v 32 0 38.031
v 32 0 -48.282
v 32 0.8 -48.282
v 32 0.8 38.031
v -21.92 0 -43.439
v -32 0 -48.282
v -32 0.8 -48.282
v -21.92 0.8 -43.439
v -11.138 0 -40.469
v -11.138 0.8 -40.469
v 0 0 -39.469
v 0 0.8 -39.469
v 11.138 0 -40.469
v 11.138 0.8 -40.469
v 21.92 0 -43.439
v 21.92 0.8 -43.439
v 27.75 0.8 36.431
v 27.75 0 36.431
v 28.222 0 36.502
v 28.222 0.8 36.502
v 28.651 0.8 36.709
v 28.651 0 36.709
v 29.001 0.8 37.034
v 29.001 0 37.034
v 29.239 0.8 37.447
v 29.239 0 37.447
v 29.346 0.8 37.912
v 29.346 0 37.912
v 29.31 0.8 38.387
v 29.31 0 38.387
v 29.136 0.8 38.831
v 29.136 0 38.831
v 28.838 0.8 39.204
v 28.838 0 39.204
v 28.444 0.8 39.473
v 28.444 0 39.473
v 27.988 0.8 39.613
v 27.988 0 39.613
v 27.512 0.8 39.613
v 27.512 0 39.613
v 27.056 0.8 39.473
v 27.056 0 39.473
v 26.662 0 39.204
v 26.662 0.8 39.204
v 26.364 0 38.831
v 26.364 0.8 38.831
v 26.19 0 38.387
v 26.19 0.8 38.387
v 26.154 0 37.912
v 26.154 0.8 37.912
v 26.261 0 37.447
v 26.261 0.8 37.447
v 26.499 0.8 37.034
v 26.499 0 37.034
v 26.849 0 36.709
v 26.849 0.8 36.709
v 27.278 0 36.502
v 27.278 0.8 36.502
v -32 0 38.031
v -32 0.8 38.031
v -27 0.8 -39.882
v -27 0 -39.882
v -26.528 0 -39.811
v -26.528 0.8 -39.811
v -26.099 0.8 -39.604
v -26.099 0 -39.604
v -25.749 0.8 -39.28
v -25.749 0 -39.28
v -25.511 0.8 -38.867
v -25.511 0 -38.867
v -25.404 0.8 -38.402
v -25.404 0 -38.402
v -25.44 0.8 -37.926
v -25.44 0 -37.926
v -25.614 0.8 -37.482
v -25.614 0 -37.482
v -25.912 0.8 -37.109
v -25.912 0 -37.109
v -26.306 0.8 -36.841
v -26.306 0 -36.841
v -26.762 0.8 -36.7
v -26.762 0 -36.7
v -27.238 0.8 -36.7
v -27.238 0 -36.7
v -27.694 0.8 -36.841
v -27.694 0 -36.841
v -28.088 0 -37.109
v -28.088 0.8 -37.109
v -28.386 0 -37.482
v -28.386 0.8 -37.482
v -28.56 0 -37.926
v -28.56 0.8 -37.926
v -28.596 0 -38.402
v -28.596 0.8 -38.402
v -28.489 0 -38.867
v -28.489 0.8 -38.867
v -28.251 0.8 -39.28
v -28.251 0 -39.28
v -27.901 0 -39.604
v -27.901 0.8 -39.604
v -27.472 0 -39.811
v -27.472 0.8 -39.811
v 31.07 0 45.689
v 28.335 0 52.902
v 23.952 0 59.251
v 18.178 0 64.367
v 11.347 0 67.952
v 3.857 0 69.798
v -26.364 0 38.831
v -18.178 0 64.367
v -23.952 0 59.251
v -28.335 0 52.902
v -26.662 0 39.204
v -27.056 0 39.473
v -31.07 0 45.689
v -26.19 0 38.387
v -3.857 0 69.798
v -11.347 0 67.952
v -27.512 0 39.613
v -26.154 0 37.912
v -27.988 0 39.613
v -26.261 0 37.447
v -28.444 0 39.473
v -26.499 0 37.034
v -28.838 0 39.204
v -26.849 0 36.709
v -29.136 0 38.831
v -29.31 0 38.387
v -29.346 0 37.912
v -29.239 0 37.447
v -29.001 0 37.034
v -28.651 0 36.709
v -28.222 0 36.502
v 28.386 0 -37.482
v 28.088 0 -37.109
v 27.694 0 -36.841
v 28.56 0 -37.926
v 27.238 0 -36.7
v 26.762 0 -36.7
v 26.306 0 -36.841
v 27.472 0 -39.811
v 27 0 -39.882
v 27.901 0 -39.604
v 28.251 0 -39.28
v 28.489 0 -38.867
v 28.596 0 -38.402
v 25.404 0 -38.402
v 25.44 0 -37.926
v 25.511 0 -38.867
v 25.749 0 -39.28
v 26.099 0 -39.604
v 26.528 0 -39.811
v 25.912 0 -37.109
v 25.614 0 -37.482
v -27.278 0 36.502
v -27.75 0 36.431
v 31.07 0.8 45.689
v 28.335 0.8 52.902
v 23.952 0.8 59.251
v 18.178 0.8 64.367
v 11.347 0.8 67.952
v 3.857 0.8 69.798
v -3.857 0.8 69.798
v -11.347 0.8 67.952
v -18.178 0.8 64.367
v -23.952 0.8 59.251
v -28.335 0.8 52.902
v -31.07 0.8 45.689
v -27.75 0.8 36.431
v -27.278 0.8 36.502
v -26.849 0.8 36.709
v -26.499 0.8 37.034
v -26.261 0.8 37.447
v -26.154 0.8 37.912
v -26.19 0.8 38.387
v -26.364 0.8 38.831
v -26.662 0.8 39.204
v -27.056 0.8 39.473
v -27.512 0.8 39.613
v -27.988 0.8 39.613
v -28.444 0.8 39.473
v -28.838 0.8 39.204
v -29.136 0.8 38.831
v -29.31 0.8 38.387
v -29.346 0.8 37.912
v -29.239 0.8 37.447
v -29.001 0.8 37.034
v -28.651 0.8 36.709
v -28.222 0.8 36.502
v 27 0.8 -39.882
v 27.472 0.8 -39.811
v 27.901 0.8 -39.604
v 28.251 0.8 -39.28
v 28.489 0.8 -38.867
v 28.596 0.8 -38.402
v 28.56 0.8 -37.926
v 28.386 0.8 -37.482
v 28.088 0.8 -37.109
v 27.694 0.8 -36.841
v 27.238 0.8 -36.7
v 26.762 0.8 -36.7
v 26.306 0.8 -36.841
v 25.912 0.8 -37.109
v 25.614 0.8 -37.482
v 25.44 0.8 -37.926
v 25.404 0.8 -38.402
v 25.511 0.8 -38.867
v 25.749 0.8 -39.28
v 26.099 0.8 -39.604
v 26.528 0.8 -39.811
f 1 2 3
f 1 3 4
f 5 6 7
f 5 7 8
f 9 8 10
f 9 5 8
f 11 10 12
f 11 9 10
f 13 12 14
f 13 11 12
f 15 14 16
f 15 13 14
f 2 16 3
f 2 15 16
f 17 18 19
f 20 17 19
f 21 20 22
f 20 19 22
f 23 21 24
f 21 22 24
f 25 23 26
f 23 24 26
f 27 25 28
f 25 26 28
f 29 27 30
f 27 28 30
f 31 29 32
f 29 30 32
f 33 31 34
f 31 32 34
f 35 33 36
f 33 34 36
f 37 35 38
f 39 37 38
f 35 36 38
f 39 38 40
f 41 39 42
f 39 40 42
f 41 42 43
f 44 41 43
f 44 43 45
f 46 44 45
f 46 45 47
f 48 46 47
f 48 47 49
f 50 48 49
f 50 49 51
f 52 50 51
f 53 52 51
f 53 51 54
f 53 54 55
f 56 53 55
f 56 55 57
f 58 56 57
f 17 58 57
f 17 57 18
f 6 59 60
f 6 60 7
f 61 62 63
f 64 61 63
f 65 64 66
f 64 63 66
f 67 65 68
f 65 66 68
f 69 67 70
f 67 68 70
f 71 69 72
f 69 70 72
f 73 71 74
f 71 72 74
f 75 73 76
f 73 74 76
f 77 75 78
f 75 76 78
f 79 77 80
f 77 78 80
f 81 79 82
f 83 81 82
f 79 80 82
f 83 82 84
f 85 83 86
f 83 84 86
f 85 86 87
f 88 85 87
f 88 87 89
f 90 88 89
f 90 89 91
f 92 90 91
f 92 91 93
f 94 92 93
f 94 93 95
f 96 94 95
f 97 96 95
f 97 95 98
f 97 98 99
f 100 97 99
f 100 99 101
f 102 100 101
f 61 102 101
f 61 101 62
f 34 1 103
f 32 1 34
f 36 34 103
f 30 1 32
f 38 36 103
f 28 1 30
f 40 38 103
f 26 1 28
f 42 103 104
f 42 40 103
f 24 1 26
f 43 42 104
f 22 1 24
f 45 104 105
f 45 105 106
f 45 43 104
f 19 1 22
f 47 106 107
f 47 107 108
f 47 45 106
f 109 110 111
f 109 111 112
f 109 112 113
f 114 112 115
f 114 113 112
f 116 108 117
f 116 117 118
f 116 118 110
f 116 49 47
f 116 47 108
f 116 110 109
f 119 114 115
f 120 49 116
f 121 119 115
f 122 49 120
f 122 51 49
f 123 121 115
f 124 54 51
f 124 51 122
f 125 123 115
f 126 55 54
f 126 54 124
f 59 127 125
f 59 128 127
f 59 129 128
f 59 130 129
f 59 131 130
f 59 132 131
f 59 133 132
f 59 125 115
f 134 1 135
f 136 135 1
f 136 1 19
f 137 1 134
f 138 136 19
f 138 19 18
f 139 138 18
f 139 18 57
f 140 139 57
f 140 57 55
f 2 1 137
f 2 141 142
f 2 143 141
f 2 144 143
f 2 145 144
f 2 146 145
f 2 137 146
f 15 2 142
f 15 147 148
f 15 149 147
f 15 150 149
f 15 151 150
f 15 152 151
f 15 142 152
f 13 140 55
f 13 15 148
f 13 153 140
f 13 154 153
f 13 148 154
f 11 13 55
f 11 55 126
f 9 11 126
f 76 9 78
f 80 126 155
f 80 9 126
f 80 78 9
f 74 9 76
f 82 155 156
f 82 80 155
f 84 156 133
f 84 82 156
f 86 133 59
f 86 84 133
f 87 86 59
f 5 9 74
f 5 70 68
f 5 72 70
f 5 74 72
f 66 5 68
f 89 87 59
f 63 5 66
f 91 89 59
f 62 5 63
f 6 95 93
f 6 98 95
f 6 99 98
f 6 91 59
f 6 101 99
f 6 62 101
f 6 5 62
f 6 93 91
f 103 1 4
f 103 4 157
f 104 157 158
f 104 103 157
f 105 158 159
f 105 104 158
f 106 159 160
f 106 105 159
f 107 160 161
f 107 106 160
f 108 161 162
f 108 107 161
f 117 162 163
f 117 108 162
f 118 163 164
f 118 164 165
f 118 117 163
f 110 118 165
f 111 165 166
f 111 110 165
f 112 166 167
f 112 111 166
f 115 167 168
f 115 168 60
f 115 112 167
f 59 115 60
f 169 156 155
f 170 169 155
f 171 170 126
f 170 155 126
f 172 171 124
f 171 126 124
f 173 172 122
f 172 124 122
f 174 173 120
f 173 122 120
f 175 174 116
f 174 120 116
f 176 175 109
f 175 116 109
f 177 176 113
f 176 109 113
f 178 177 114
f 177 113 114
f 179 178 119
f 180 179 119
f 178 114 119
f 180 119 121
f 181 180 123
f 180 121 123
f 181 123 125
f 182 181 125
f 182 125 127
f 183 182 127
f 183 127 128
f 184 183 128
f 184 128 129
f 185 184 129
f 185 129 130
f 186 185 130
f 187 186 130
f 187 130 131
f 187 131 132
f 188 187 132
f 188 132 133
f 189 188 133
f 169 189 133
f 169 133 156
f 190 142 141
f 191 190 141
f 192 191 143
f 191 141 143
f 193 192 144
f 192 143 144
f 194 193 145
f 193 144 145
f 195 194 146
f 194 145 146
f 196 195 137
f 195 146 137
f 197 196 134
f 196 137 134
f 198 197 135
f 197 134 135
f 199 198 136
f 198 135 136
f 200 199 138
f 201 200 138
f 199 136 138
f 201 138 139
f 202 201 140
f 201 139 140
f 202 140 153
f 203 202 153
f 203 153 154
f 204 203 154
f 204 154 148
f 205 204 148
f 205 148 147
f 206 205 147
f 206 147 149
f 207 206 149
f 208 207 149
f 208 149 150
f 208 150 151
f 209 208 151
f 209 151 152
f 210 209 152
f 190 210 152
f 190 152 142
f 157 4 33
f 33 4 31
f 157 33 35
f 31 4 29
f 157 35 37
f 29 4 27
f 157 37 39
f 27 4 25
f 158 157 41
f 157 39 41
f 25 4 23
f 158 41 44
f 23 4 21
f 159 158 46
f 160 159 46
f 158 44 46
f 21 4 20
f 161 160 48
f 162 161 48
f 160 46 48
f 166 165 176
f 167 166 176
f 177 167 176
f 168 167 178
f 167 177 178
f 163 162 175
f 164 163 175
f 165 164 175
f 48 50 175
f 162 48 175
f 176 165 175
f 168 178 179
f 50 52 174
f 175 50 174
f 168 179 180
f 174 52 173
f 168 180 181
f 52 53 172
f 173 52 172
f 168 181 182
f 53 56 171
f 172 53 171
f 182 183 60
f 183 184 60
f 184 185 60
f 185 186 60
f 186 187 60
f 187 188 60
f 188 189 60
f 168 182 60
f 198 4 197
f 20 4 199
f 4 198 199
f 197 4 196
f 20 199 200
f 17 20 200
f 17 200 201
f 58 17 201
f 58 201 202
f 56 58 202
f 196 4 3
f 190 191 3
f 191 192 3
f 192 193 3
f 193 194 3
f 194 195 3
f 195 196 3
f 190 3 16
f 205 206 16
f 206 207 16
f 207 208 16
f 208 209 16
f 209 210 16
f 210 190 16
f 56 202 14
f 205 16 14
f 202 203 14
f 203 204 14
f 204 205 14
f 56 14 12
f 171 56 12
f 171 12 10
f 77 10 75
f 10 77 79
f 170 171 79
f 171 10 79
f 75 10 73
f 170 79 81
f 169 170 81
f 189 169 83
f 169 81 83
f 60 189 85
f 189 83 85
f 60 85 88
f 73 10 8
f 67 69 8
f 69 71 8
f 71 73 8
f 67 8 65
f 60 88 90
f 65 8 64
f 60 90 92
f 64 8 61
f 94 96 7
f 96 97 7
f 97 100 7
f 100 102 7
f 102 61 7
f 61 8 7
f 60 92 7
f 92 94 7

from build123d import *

# Parameters (mm, degrees)
BOSS_EXTRUDE1_DEPTH = 0.8
SKETCH2_R           = 1.6
CUT_EXTRUDE1_DEPTH  = 78.000105196


with BuildPart() as part:
    # Sketch1 → Boss-Extrude1 (new body)
    with BuildSketch(Plane(origin=(0, 0, 0), x_dir=(1, 0, 0), z_dir=(0, 1, 0))):
        with BuildLine():
            Line((-32, -38.031251597), (-32, 48.282157899))
            ThreePointArc((-32, 48.282157899), (0, 39.468748403), (32, 48.282157899))
            Line((32, 48.282157899), (32, -38.031251597))
            ThreePointArc((32, -38.031251597), (0, -70.031251597), (-32, -38.031251597))
        make_face()
    extrude(amount=BOSS_EXTRUDE1_DEPTH)

    # Sketch2 → Cut-Extrude1 (cut, through all)
    with BuildSketch(Plane.XZ):
        with Locations(Location((27.75, 38.031251597, 0), (0, 0, 270))):
            Circle(SKETCH2_R)
        with Locations(Location((-27.75, 38.031251597, 0), (0, 0, 270))):
            Circle(SKETCH2_R)
        with Locations(Location((27, -38.282157899, 0), (0, 0, 270))):
            Circle(SKETCH2_R)
        with Locations(Location((-27, -38.282157899, 0), (0, 0, 270))):
            Circle(SKETCH2_R)
    extrude(amount=-CUT_EXTRUDE1_DEPTH, mode=Mode.SUBTRACT)


solid = part.part
